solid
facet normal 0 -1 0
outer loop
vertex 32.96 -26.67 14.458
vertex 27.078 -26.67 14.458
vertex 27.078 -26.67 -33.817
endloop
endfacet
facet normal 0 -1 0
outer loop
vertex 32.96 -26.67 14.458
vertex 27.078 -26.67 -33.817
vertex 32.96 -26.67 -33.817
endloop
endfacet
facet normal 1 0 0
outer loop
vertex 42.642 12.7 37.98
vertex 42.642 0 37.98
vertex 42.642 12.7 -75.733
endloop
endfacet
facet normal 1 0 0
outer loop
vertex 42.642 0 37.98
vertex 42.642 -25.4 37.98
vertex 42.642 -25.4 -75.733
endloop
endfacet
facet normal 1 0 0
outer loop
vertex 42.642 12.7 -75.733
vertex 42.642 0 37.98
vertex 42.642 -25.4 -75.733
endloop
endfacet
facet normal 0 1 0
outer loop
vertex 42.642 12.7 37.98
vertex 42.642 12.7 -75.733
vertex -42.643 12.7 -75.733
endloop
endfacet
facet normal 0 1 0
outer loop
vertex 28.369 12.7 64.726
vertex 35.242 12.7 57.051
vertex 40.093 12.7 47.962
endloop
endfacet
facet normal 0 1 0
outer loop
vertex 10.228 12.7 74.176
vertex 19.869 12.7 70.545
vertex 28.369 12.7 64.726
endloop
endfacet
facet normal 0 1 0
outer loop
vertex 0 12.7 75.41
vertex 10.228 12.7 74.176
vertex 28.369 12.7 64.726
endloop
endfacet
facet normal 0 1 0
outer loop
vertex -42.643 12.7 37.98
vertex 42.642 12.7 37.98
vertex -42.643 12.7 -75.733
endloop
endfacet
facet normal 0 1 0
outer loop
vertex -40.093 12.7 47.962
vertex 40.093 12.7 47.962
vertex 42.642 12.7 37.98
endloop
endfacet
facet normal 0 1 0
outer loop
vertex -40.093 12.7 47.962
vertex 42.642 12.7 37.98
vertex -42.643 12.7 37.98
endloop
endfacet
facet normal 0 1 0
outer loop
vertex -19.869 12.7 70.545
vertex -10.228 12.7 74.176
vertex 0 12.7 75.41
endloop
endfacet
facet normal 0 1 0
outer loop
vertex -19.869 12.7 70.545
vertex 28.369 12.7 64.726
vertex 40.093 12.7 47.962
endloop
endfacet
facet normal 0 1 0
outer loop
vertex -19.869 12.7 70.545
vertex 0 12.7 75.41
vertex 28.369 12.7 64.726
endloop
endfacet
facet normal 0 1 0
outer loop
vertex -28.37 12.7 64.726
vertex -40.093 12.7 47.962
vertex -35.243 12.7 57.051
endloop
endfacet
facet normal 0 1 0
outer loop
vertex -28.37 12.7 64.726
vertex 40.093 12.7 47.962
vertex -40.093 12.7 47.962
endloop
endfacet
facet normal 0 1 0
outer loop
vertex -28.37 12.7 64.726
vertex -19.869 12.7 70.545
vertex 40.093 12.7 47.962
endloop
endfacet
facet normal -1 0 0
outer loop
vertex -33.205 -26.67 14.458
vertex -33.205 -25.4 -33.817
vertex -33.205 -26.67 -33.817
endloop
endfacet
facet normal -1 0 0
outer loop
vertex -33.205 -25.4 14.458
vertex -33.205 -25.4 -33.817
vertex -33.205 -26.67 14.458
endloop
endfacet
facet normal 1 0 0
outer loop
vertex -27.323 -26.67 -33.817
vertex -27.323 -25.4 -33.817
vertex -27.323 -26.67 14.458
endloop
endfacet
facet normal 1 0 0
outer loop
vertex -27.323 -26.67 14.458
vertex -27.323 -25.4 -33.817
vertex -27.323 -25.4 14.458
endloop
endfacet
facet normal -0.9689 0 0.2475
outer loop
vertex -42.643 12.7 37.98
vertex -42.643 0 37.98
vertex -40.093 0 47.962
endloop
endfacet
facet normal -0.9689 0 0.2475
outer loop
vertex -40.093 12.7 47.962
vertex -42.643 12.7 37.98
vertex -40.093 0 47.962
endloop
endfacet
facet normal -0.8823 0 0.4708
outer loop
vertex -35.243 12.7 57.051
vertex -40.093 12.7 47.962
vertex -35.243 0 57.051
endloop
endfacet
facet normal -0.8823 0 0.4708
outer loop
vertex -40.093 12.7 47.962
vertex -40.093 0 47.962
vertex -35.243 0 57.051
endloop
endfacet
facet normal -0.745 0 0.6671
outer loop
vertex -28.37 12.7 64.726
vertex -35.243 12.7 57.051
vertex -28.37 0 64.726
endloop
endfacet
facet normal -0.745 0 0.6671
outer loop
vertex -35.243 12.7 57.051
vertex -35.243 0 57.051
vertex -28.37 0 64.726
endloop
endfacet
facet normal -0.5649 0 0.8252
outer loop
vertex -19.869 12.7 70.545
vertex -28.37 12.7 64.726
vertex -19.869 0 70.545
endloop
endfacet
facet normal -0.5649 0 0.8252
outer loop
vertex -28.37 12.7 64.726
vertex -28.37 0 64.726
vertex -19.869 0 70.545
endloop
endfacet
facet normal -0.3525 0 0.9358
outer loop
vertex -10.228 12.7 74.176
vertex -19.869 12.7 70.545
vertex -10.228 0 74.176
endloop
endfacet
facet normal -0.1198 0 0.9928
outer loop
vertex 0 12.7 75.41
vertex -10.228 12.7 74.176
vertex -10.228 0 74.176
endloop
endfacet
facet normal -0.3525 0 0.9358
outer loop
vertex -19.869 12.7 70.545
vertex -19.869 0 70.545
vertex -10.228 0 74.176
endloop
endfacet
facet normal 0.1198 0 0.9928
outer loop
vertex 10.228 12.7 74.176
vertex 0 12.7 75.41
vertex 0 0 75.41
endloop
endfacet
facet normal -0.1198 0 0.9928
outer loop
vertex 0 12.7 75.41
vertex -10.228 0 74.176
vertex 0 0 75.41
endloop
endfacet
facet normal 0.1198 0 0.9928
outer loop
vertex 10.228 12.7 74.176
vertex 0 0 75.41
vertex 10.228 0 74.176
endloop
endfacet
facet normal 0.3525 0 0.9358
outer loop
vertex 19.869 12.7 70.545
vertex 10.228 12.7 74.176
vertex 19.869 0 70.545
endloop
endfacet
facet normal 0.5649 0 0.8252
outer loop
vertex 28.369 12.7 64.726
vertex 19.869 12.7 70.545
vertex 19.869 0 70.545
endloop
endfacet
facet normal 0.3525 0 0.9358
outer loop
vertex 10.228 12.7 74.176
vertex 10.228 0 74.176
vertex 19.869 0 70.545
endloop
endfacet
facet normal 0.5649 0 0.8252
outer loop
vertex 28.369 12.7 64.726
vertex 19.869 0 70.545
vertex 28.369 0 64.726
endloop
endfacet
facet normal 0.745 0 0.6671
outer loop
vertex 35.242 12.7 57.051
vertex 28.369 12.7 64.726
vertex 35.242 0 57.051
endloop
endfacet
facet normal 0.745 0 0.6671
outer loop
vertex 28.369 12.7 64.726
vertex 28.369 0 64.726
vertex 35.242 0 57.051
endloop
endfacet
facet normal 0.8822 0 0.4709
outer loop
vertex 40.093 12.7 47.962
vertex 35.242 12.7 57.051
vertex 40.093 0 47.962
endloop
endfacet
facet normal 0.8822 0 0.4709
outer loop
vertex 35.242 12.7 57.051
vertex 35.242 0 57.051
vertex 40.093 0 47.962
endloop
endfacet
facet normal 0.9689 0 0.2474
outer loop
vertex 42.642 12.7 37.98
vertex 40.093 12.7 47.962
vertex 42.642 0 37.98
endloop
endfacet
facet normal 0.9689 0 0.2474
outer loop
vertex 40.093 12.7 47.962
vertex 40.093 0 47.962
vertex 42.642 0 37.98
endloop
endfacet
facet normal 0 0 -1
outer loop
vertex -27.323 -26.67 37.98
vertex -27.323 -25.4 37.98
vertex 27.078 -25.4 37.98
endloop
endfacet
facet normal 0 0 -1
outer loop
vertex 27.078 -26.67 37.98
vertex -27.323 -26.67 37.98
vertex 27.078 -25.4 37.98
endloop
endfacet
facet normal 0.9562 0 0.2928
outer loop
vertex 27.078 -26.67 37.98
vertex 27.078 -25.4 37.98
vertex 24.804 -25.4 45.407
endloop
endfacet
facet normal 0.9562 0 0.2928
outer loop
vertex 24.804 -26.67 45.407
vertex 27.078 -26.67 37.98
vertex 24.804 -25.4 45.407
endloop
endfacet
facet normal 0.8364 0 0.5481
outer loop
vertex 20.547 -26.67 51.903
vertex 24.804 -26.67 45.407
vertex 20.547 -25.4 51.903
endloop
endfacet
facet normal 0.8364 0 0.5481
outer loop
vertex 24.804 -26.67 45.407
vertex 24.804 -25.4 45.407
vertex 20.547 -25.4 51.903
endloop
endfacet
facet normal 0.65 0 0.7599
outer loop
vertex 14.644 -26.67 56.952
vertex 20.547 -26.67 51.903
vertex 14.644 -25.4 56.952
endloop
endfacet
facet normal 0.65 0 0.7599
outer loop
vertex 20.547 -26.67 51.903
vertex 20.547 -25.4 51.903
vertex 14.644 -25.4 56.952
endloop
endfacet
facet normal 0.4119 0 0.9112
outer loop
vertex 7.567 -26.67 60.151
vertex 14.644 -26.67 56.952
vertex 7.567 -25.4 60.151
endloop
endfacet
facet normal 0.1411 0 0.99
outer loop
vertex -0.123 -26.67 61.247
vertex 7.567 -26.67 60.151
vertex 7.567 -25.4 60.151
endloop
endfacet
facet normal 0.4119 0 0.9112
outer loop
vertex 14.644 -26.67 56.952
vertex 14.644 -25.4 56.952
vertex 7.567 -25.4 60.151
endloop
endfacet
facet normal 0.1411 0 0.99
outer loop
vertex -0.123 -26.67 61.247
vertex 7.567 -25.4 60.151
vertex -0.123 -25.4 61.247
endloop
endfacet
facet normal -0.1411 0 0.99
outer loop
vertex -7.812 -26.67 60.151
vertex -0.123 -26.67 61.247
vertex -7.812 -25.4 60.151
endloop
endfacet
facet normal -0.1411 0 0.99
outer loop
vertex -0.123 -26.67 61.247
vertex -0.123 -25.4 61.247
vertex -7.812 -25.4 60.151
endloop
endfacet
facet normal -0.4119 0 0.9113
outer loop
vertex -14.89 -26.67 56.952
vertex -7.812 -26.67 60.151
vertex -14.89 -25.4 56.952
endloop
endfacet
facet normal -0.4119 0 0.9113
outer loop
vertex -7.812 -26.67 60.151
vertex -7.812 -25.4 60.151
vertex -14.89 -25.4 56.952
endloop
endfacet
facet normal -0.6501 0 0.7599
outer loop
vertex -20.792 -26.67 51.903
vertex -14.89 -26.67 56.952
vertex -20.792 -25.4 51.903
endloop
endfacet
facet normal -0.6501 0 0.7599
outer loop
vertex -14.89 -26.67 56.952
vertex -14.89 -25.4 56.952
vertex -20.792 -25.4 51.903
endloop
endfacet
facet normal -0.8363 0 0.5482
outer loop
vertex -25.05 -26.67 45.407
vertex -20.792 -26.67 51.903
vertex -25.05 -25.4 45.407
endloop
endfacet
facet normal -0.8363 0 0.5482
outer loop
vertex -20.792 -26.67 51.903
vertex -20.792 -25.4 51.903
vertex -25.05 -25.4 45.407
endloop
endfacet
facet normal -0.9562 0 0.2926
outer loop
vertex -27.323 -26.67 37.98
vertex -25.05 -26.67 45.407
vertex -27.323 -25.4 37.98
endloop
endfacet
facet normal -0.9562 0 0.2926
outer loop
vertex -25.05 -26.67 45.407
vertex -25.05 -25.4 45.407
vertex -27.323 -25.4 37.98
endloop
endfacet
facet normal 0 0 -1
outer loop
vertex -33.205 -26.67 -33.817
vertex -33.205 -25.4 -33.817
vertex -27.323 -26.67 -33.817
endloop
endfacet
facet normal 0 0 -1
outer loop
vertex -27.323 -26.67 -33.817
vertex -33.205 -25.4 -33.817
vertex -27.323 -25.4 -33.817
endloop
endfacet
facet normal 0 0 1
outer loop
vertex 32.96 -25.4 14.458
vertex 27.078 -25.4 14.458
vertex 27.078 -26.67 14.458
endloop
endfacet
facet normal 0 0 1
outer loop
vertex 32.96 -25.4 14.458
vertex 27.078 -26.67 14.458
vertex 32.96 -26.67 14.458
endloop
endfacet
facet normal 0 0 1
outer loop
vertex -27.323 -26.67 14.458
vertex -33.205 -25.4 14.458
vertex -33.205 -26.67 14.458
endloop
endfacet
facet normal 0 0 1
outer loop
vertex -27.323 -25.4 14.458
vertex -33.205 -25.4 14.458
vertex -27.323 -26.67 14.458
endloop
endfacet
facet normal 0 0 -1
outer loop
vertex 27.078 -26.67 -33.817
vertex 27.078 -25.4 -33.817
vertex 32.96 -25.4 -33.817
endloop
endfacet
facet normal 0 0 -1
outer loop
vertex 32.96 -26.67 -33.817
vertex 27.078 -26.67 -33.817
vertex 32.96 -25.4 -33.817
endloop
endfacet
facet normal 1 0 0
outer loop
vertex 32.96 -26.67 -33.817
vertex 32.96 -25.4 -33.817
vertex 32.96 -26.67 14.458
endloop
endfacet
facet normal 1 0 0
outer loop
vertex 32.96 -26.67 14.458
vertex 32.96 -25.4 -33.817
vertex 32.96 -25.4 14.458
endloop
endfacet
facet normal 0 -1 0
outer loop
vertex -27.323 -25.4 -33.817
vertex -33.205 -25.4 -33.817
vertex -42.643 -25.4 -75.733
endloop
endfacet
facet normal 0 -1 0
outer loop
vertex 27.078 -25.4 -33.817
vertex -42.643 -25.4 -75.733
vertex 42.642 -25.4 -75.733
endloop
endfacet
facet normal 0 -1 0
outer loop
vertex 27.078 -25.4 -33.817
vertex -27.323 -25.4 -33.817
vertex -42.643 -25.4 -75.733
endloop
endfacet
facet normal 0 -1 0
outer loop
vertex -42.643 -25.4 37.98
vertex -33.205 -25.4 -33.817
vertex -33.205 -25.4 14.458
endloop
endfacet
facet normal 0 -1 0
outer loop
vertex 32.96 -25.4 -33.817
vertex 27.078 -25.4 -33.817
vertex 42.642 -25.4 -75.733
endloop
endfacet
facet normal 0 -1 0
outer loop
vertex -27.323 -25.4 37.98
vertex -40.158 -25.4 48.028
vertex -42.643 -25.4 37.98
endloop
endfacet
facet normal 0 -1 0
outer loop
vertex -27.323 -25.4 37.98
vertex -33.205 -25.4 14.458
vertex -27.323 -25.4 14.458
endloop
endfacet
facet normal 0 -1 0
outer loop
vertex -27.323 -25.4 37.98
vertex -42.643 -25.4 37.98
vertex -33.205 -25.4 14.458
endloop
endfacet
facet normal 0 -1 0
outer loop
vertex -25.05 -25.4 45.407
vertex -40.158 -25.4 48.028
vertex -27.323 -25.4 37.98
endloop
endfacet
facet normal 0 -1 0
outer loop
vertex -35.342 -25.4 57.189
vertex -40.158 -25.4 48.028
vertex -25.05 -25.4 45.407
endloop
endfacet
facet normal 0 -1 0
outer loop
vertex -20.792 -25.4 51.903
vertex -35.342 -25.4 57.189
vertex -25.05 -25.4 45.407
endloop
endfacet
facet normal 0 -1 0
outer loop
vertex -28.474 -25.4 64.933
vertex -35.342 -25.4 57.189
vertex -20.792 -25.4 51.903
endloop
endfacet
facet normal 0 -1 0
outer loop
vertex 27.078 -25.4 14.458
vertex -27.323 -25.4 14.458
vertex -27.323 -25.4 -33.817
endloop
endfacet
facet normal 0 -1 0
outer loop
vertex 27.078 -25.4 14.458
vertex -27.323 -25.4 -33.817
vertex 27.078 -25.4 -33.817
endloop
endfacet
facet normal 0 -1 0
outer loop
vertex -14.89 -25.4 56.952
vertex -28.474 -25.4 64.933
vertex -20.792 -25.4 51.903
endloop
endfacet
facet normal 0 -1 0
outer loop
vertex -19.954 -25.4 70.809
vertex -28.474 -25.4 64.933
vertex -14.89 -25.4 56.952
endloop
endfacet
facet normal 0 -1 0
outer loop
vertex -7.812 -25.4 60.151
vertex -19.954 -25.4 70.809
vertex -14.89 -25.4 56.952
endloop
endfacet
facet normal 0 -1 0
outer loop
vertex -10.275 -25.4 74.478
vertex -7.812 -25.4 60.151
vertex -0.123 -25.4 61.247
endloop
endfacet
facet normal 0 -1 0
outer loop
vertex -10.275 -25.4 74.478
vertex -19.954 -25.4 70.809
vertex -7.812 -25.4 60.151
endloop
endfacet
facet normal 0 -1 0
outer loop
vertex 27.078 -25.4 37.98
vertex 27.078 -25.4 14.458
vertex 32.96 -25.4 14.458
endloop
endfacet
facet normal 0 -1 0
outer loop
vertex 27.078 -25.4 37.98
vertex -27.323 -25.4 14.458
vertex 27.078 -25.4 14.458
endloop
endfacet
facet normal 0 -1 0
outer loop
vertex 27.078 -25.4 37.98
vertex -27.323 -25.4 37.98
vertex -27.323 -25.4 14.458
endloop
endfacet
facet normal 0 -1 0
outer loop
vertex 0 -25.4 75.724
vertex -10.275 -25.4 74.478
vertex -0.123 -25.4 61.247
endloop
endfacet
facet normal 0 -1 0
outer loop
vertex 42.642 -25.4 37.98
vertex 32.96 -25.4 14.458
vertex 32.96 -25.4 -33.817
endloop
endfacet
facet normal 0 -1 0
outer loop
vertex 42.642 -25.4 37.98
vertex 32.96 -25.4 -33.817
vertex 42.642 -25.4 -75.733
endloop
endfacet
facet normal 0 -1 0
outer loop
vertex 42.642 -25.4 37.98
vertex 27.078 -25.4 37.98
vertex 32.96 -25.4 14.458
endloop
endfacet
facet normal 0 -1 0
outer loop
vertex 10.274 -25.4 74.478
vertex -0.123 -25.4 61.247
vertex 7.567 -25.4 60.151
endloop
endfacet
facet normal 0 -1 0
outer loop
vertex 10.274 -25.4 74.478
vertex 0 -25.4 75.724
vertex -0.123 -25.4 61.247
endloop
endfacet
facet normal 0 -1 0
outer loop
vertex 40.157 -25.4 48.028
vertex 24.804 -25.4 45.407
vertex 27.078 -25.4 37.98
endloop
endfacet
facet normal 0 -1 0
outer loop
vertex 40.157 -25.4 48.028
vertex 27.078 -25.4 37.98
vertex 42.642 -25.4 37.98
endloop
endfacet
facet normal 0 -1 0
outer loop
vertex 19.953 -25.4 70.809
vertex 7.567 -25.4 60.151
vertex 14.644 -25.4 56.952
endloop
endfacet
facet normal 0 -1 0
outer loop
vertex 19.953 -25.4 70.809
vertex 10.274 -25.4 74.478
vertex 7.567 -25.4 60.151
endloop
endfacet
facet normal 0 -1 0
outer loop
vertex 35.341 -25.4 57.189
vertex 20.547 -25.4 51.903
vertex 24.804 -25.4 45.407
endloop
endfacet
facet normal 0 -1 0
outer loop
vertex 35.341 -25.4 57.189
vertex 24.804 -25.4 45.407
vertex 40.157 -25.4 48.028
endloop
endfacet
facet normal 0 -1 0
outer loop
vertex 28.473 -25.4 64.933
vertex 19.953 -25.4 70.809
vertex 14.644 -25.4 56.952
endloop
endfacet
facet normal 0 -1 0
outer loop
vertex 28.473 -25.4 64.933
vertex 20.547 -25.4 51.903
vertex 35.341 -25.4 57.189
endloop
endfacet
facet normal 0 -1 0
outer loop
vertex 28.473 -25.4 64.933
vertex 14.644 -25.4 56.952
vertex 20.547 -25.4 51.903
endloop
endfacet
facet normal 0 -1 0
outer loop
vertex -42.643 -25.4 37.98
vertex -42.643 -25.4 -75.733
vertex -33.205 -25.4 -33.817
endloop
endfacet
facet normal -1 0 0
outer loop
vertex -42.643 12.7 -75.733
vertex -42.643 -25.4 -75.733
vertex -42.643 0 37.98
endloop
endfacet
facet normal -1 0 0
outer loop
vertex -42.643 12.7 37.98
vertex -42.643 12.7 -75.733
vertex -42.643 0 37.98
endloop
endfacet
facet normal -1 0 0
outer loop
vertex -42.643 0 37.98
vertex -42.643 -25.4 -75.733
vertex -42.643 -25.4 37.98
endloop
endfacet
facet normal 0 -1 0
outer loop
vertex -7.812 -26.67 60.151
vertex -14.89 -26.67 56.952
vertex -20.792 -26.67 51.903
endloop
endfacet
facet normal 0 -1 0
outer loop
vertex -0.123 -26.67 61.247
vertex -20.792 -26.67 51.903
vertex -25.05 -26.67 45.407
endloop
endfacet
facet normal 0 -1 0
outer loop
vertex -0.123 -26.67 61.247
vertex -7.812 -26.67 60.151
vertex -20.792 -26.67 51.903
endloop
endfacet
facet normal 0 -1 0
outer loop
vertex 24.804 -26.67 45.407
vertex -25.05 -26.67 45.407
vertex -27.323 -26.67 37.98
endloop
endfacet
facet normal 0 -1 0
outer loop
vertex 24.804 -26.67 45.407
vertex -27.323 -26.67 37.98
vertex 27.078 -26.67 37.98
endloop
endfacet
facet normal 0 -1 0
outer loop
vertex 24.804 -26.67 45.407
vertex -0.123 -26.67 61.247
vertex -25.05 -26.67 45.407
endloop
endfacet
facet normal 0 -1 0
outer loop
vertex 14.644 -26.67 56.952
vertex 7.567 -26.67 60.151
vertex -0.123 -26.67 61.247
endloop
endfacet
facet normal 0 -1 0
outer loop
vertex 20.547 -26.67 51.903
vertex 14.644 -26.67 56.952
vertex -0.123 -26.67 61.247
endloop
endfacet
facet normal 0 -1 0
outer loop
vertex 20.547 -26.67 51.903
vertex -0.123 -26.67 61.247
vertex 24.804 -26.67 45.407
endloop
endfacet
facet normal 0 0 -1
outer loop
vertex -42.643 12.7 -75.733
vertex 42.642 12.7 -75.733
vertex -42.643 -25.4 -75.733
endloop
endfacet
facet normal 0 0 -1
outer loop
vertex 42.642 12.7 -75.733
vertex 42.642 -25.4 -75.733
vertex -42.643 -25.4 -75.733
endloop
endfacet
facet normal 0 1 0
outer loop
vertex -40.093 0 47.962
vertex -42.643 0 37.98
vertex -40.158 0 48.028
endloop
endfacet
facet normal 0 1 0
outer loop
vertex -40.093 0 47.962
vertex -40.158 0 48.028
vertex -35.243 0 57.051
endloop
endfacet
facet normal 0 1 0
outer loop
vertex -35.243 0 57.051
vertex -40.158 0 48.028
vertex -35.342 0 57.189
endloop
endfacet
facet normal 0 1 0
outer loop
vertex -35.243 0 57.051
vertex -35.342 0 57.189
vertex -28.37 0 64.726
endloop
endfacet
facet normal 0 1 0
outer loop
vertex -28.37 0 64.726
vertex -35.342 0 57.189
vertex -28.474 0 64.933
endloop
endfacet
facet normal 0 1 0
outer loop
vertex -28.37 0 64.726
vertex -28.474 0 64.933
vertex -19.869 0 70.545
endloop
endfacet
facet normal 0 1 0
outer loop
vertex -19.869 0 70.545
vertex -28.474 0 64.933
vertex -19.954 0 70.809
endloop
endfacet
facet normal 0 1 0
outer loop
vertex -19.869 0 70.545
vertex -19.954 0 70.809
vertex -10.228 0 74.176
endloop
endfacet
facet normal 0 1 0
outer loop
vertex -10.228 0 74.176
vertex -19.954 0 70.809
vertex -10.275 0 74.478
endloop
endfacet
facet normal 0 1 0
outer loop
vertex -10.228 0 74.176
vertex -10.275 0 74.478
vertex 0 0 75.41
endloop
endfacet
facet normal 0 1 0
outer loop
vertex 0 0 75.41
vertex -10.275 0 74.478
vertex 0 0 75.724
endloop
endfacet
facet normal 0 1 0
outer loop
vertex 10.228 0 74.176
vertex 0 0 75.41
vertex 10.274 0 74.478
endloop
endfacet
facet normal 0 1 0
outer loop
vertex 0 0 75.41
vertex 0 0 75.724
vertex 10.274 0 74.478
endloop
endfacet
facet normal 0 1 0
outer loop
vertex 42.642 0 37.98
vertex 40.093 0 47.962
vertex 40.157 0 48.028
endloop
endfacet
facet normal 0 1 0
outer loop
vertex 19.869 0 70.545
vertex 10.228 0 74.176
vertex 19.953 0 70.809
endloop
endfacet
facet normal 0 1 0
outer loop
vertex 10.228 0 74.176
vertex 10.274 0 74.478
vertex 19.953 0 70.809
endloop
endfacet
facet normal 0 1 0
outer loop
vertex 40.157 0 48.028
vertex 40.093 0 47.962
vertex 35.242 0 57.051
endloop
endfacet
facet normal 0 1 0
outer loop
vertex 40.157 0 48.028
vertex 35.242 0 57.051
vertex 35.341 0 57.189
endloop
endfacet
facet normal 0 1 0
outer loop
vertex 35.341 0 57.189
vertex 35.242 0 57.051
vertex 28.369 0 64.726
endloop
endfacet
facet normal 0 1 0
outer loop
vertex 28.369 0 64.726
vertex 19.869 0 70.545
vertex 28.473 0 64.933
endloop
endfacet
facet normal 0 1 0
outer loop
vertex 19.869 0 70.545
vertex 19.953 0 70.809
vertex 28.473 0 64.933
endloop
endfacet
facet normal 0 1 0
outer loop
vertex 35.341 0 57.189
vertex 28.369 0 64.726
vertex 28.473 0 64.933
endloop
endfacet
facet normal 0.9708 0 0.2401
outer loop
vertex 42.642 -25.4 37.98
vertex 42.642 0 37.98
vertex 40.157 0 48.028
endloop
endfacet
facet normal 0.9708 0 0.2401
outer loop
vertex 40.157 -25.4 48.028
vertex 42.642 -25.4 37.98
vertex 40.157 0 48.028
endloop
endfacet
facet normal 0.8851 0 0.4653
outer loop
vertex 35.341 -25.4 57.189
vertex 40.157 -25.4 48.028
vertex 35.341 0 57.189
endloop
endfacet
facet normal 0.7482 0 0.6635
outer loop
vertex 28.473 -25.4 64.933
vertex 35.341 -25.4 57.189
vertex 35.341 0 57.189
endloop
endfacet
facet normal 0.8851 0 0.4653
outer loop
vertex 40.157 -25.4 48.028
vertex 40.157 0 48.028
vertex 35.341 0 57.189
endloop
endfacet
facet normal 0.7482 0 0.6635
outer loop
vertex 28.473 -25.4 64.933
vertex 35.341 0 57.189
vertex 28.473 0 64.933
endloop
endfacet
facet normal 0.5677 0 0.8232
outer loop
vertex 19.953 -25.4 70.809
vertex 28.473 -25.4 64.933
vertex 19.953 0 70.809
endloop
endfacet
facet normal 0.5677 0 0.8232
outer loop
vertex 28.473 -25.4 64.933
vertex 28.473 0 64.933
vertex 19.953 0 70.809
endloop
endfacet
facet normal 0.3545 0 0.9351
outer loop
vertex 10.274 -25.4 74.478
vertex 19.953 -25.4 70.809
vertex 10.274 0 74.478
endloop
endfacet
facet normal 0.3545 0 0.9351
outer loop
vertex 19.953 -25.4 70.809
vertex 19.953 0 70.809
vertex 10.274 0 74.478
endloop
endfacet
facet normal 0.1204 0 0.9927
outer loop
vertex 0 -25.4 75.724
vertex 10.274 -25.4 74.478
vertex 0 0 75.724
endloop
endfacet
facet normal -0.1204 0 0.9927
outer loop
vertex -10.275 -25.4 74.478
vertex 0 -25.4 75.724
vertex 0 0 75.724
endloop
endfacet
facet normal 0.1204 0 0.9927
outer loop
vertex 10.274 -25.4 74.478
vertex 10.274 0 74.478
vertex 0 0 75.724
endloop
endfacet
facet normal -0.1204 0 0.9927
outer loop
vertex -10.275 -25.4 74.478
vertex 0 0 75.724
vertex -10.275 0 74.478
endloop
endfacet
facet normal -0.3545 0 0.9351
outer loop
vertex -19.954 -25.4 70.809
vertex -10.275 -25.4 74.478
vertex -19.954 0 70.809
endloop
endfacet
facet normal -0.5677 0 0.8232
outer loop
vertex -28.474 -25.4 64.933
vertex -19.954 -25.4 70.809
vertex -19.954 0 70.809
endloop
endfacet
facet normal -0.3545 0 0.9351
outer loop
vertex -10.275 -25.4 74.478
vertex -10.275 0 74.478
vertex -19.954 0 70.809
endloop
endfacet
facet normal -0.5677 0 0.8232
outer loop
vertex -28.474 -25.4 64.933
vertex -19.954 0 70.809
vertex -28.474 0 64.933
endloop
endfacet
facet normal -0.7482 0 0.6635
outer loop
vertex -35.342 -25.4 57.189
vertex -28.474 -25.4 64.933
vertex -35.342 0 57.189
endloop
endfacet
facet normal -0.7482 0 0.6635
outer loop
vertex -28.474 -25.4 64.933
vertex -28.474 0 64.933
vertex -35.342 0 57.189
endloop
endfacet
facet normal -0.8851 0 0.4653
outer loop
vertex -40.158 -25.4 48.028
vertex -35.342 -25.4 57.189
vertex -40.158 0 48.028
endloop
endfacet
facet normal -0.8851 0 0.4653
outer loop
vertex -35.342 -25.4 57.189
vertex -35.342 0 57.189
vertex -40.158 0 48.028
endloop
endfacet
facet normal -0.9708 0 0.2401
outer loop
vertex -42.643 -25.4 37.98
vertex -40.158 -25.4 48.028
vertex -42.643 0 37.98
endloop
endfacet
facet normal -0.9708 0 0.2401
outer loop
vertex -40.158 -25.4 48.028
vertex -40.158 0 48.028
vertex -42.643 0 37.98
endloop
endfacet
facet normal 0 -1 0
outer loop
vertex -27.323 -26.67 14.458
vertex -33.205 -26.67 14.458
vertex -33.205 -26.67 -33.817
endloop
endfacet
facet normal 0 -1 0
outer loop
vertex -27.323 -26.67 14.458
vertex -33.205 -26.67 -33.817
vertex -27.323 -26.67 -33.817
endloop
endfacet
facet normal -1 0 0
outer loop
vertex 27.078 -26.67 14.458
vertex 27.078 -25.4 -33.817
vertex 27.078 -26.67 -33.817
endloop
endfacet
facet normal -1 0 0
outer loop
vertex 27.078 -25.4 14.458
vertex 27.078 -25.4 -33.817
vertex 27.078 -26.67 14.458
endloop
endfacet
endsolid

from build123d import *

# Parameters (mm, degrees)
F1_DEPTH = 25.4
F3_DEPTH = 12.7
F4_W     = 5.8812871575
F4_H     = 48.275558278
F4_W_2   = 5.8812852949
F5_DEPTH = 1.27
F7_DEPTH = 1.27


with BuildPart() as f1:
    # F0 (on Front) → F1 (new body)
    with BuildSketch(Plane.XZ):
        with BuildLine():
            Line((-42.643032968, 37.9803813994), (-42.643032968, 0))
            Line((-42.643032968, 0), (0, 0))
            Line((0, 0), (42.642146349, 0))
            Line((42.642146349, 0), (42.642146349, 37.9803813994))
            ThreePointArc((42.642146349, 37.9803813994), (-0.0004433095, 75.7243208105), (-42.643032968, 37.9803813994))
        make_face()
        Polygon((0, 0), (-42.643032968, 0), (-42.643032968, -75.733192265), (42.642146349, -75.733192265), (42.642146349, 0), align=None)
    extrude(amount=F1_DEPTH)

    # F2 (on face) → F3 (join)
    with BuildSketch(Plane(origin=(0, 0, 0), x_dir=(-1, 0, 0), z_dir=(0, 1, 0))):
        with BuildLine():
            ThreePointArc((42.643032968, 37.9803813994), (0.0004433095, 75.4104343916), (-42.642146349, 37.9803813994))
            Line((-42.642146349, 37.9803813994), (-42.642146349, -75.733192265))
            Line((-42.642146349, -75.733192265), (42.643032968, -75.733192265))
            Line((42.643032968, -75.733192265), (42.643032968, 37.9803813994))
        make_face()
    extrude(amount=F3_DEPTH)

    # F4 (on face) → F5 (join)
    with BuildSketch(Plane.XZ.offset(25.4)):
        with Locations((-30.264120549, -9.6796164289)):
            Rectangle(F4_W, F4_H)
        with Locations((30.0190644339, -9.6796164289)):
            Rectangle(F4_W_2, F4_H)
    extrude(amount=F5_DEPTH)

    # F6 (on face) → F7 (join)
    with BuildSketch(Plane.XZ.offset(25.4)):
        with BuildLine():
            ThreePointArc((27.0784217864, 37.9803813994), (-0.1225275919, 61.2469587983), (-27.3234769702, 37.9803813994))
            Line((-27.3234769702, 37.9803813994), (27.0784217864, 37.9803813994))
        make_face()
    extrude(amount=F7_DEPTH)


solid = f1.part
